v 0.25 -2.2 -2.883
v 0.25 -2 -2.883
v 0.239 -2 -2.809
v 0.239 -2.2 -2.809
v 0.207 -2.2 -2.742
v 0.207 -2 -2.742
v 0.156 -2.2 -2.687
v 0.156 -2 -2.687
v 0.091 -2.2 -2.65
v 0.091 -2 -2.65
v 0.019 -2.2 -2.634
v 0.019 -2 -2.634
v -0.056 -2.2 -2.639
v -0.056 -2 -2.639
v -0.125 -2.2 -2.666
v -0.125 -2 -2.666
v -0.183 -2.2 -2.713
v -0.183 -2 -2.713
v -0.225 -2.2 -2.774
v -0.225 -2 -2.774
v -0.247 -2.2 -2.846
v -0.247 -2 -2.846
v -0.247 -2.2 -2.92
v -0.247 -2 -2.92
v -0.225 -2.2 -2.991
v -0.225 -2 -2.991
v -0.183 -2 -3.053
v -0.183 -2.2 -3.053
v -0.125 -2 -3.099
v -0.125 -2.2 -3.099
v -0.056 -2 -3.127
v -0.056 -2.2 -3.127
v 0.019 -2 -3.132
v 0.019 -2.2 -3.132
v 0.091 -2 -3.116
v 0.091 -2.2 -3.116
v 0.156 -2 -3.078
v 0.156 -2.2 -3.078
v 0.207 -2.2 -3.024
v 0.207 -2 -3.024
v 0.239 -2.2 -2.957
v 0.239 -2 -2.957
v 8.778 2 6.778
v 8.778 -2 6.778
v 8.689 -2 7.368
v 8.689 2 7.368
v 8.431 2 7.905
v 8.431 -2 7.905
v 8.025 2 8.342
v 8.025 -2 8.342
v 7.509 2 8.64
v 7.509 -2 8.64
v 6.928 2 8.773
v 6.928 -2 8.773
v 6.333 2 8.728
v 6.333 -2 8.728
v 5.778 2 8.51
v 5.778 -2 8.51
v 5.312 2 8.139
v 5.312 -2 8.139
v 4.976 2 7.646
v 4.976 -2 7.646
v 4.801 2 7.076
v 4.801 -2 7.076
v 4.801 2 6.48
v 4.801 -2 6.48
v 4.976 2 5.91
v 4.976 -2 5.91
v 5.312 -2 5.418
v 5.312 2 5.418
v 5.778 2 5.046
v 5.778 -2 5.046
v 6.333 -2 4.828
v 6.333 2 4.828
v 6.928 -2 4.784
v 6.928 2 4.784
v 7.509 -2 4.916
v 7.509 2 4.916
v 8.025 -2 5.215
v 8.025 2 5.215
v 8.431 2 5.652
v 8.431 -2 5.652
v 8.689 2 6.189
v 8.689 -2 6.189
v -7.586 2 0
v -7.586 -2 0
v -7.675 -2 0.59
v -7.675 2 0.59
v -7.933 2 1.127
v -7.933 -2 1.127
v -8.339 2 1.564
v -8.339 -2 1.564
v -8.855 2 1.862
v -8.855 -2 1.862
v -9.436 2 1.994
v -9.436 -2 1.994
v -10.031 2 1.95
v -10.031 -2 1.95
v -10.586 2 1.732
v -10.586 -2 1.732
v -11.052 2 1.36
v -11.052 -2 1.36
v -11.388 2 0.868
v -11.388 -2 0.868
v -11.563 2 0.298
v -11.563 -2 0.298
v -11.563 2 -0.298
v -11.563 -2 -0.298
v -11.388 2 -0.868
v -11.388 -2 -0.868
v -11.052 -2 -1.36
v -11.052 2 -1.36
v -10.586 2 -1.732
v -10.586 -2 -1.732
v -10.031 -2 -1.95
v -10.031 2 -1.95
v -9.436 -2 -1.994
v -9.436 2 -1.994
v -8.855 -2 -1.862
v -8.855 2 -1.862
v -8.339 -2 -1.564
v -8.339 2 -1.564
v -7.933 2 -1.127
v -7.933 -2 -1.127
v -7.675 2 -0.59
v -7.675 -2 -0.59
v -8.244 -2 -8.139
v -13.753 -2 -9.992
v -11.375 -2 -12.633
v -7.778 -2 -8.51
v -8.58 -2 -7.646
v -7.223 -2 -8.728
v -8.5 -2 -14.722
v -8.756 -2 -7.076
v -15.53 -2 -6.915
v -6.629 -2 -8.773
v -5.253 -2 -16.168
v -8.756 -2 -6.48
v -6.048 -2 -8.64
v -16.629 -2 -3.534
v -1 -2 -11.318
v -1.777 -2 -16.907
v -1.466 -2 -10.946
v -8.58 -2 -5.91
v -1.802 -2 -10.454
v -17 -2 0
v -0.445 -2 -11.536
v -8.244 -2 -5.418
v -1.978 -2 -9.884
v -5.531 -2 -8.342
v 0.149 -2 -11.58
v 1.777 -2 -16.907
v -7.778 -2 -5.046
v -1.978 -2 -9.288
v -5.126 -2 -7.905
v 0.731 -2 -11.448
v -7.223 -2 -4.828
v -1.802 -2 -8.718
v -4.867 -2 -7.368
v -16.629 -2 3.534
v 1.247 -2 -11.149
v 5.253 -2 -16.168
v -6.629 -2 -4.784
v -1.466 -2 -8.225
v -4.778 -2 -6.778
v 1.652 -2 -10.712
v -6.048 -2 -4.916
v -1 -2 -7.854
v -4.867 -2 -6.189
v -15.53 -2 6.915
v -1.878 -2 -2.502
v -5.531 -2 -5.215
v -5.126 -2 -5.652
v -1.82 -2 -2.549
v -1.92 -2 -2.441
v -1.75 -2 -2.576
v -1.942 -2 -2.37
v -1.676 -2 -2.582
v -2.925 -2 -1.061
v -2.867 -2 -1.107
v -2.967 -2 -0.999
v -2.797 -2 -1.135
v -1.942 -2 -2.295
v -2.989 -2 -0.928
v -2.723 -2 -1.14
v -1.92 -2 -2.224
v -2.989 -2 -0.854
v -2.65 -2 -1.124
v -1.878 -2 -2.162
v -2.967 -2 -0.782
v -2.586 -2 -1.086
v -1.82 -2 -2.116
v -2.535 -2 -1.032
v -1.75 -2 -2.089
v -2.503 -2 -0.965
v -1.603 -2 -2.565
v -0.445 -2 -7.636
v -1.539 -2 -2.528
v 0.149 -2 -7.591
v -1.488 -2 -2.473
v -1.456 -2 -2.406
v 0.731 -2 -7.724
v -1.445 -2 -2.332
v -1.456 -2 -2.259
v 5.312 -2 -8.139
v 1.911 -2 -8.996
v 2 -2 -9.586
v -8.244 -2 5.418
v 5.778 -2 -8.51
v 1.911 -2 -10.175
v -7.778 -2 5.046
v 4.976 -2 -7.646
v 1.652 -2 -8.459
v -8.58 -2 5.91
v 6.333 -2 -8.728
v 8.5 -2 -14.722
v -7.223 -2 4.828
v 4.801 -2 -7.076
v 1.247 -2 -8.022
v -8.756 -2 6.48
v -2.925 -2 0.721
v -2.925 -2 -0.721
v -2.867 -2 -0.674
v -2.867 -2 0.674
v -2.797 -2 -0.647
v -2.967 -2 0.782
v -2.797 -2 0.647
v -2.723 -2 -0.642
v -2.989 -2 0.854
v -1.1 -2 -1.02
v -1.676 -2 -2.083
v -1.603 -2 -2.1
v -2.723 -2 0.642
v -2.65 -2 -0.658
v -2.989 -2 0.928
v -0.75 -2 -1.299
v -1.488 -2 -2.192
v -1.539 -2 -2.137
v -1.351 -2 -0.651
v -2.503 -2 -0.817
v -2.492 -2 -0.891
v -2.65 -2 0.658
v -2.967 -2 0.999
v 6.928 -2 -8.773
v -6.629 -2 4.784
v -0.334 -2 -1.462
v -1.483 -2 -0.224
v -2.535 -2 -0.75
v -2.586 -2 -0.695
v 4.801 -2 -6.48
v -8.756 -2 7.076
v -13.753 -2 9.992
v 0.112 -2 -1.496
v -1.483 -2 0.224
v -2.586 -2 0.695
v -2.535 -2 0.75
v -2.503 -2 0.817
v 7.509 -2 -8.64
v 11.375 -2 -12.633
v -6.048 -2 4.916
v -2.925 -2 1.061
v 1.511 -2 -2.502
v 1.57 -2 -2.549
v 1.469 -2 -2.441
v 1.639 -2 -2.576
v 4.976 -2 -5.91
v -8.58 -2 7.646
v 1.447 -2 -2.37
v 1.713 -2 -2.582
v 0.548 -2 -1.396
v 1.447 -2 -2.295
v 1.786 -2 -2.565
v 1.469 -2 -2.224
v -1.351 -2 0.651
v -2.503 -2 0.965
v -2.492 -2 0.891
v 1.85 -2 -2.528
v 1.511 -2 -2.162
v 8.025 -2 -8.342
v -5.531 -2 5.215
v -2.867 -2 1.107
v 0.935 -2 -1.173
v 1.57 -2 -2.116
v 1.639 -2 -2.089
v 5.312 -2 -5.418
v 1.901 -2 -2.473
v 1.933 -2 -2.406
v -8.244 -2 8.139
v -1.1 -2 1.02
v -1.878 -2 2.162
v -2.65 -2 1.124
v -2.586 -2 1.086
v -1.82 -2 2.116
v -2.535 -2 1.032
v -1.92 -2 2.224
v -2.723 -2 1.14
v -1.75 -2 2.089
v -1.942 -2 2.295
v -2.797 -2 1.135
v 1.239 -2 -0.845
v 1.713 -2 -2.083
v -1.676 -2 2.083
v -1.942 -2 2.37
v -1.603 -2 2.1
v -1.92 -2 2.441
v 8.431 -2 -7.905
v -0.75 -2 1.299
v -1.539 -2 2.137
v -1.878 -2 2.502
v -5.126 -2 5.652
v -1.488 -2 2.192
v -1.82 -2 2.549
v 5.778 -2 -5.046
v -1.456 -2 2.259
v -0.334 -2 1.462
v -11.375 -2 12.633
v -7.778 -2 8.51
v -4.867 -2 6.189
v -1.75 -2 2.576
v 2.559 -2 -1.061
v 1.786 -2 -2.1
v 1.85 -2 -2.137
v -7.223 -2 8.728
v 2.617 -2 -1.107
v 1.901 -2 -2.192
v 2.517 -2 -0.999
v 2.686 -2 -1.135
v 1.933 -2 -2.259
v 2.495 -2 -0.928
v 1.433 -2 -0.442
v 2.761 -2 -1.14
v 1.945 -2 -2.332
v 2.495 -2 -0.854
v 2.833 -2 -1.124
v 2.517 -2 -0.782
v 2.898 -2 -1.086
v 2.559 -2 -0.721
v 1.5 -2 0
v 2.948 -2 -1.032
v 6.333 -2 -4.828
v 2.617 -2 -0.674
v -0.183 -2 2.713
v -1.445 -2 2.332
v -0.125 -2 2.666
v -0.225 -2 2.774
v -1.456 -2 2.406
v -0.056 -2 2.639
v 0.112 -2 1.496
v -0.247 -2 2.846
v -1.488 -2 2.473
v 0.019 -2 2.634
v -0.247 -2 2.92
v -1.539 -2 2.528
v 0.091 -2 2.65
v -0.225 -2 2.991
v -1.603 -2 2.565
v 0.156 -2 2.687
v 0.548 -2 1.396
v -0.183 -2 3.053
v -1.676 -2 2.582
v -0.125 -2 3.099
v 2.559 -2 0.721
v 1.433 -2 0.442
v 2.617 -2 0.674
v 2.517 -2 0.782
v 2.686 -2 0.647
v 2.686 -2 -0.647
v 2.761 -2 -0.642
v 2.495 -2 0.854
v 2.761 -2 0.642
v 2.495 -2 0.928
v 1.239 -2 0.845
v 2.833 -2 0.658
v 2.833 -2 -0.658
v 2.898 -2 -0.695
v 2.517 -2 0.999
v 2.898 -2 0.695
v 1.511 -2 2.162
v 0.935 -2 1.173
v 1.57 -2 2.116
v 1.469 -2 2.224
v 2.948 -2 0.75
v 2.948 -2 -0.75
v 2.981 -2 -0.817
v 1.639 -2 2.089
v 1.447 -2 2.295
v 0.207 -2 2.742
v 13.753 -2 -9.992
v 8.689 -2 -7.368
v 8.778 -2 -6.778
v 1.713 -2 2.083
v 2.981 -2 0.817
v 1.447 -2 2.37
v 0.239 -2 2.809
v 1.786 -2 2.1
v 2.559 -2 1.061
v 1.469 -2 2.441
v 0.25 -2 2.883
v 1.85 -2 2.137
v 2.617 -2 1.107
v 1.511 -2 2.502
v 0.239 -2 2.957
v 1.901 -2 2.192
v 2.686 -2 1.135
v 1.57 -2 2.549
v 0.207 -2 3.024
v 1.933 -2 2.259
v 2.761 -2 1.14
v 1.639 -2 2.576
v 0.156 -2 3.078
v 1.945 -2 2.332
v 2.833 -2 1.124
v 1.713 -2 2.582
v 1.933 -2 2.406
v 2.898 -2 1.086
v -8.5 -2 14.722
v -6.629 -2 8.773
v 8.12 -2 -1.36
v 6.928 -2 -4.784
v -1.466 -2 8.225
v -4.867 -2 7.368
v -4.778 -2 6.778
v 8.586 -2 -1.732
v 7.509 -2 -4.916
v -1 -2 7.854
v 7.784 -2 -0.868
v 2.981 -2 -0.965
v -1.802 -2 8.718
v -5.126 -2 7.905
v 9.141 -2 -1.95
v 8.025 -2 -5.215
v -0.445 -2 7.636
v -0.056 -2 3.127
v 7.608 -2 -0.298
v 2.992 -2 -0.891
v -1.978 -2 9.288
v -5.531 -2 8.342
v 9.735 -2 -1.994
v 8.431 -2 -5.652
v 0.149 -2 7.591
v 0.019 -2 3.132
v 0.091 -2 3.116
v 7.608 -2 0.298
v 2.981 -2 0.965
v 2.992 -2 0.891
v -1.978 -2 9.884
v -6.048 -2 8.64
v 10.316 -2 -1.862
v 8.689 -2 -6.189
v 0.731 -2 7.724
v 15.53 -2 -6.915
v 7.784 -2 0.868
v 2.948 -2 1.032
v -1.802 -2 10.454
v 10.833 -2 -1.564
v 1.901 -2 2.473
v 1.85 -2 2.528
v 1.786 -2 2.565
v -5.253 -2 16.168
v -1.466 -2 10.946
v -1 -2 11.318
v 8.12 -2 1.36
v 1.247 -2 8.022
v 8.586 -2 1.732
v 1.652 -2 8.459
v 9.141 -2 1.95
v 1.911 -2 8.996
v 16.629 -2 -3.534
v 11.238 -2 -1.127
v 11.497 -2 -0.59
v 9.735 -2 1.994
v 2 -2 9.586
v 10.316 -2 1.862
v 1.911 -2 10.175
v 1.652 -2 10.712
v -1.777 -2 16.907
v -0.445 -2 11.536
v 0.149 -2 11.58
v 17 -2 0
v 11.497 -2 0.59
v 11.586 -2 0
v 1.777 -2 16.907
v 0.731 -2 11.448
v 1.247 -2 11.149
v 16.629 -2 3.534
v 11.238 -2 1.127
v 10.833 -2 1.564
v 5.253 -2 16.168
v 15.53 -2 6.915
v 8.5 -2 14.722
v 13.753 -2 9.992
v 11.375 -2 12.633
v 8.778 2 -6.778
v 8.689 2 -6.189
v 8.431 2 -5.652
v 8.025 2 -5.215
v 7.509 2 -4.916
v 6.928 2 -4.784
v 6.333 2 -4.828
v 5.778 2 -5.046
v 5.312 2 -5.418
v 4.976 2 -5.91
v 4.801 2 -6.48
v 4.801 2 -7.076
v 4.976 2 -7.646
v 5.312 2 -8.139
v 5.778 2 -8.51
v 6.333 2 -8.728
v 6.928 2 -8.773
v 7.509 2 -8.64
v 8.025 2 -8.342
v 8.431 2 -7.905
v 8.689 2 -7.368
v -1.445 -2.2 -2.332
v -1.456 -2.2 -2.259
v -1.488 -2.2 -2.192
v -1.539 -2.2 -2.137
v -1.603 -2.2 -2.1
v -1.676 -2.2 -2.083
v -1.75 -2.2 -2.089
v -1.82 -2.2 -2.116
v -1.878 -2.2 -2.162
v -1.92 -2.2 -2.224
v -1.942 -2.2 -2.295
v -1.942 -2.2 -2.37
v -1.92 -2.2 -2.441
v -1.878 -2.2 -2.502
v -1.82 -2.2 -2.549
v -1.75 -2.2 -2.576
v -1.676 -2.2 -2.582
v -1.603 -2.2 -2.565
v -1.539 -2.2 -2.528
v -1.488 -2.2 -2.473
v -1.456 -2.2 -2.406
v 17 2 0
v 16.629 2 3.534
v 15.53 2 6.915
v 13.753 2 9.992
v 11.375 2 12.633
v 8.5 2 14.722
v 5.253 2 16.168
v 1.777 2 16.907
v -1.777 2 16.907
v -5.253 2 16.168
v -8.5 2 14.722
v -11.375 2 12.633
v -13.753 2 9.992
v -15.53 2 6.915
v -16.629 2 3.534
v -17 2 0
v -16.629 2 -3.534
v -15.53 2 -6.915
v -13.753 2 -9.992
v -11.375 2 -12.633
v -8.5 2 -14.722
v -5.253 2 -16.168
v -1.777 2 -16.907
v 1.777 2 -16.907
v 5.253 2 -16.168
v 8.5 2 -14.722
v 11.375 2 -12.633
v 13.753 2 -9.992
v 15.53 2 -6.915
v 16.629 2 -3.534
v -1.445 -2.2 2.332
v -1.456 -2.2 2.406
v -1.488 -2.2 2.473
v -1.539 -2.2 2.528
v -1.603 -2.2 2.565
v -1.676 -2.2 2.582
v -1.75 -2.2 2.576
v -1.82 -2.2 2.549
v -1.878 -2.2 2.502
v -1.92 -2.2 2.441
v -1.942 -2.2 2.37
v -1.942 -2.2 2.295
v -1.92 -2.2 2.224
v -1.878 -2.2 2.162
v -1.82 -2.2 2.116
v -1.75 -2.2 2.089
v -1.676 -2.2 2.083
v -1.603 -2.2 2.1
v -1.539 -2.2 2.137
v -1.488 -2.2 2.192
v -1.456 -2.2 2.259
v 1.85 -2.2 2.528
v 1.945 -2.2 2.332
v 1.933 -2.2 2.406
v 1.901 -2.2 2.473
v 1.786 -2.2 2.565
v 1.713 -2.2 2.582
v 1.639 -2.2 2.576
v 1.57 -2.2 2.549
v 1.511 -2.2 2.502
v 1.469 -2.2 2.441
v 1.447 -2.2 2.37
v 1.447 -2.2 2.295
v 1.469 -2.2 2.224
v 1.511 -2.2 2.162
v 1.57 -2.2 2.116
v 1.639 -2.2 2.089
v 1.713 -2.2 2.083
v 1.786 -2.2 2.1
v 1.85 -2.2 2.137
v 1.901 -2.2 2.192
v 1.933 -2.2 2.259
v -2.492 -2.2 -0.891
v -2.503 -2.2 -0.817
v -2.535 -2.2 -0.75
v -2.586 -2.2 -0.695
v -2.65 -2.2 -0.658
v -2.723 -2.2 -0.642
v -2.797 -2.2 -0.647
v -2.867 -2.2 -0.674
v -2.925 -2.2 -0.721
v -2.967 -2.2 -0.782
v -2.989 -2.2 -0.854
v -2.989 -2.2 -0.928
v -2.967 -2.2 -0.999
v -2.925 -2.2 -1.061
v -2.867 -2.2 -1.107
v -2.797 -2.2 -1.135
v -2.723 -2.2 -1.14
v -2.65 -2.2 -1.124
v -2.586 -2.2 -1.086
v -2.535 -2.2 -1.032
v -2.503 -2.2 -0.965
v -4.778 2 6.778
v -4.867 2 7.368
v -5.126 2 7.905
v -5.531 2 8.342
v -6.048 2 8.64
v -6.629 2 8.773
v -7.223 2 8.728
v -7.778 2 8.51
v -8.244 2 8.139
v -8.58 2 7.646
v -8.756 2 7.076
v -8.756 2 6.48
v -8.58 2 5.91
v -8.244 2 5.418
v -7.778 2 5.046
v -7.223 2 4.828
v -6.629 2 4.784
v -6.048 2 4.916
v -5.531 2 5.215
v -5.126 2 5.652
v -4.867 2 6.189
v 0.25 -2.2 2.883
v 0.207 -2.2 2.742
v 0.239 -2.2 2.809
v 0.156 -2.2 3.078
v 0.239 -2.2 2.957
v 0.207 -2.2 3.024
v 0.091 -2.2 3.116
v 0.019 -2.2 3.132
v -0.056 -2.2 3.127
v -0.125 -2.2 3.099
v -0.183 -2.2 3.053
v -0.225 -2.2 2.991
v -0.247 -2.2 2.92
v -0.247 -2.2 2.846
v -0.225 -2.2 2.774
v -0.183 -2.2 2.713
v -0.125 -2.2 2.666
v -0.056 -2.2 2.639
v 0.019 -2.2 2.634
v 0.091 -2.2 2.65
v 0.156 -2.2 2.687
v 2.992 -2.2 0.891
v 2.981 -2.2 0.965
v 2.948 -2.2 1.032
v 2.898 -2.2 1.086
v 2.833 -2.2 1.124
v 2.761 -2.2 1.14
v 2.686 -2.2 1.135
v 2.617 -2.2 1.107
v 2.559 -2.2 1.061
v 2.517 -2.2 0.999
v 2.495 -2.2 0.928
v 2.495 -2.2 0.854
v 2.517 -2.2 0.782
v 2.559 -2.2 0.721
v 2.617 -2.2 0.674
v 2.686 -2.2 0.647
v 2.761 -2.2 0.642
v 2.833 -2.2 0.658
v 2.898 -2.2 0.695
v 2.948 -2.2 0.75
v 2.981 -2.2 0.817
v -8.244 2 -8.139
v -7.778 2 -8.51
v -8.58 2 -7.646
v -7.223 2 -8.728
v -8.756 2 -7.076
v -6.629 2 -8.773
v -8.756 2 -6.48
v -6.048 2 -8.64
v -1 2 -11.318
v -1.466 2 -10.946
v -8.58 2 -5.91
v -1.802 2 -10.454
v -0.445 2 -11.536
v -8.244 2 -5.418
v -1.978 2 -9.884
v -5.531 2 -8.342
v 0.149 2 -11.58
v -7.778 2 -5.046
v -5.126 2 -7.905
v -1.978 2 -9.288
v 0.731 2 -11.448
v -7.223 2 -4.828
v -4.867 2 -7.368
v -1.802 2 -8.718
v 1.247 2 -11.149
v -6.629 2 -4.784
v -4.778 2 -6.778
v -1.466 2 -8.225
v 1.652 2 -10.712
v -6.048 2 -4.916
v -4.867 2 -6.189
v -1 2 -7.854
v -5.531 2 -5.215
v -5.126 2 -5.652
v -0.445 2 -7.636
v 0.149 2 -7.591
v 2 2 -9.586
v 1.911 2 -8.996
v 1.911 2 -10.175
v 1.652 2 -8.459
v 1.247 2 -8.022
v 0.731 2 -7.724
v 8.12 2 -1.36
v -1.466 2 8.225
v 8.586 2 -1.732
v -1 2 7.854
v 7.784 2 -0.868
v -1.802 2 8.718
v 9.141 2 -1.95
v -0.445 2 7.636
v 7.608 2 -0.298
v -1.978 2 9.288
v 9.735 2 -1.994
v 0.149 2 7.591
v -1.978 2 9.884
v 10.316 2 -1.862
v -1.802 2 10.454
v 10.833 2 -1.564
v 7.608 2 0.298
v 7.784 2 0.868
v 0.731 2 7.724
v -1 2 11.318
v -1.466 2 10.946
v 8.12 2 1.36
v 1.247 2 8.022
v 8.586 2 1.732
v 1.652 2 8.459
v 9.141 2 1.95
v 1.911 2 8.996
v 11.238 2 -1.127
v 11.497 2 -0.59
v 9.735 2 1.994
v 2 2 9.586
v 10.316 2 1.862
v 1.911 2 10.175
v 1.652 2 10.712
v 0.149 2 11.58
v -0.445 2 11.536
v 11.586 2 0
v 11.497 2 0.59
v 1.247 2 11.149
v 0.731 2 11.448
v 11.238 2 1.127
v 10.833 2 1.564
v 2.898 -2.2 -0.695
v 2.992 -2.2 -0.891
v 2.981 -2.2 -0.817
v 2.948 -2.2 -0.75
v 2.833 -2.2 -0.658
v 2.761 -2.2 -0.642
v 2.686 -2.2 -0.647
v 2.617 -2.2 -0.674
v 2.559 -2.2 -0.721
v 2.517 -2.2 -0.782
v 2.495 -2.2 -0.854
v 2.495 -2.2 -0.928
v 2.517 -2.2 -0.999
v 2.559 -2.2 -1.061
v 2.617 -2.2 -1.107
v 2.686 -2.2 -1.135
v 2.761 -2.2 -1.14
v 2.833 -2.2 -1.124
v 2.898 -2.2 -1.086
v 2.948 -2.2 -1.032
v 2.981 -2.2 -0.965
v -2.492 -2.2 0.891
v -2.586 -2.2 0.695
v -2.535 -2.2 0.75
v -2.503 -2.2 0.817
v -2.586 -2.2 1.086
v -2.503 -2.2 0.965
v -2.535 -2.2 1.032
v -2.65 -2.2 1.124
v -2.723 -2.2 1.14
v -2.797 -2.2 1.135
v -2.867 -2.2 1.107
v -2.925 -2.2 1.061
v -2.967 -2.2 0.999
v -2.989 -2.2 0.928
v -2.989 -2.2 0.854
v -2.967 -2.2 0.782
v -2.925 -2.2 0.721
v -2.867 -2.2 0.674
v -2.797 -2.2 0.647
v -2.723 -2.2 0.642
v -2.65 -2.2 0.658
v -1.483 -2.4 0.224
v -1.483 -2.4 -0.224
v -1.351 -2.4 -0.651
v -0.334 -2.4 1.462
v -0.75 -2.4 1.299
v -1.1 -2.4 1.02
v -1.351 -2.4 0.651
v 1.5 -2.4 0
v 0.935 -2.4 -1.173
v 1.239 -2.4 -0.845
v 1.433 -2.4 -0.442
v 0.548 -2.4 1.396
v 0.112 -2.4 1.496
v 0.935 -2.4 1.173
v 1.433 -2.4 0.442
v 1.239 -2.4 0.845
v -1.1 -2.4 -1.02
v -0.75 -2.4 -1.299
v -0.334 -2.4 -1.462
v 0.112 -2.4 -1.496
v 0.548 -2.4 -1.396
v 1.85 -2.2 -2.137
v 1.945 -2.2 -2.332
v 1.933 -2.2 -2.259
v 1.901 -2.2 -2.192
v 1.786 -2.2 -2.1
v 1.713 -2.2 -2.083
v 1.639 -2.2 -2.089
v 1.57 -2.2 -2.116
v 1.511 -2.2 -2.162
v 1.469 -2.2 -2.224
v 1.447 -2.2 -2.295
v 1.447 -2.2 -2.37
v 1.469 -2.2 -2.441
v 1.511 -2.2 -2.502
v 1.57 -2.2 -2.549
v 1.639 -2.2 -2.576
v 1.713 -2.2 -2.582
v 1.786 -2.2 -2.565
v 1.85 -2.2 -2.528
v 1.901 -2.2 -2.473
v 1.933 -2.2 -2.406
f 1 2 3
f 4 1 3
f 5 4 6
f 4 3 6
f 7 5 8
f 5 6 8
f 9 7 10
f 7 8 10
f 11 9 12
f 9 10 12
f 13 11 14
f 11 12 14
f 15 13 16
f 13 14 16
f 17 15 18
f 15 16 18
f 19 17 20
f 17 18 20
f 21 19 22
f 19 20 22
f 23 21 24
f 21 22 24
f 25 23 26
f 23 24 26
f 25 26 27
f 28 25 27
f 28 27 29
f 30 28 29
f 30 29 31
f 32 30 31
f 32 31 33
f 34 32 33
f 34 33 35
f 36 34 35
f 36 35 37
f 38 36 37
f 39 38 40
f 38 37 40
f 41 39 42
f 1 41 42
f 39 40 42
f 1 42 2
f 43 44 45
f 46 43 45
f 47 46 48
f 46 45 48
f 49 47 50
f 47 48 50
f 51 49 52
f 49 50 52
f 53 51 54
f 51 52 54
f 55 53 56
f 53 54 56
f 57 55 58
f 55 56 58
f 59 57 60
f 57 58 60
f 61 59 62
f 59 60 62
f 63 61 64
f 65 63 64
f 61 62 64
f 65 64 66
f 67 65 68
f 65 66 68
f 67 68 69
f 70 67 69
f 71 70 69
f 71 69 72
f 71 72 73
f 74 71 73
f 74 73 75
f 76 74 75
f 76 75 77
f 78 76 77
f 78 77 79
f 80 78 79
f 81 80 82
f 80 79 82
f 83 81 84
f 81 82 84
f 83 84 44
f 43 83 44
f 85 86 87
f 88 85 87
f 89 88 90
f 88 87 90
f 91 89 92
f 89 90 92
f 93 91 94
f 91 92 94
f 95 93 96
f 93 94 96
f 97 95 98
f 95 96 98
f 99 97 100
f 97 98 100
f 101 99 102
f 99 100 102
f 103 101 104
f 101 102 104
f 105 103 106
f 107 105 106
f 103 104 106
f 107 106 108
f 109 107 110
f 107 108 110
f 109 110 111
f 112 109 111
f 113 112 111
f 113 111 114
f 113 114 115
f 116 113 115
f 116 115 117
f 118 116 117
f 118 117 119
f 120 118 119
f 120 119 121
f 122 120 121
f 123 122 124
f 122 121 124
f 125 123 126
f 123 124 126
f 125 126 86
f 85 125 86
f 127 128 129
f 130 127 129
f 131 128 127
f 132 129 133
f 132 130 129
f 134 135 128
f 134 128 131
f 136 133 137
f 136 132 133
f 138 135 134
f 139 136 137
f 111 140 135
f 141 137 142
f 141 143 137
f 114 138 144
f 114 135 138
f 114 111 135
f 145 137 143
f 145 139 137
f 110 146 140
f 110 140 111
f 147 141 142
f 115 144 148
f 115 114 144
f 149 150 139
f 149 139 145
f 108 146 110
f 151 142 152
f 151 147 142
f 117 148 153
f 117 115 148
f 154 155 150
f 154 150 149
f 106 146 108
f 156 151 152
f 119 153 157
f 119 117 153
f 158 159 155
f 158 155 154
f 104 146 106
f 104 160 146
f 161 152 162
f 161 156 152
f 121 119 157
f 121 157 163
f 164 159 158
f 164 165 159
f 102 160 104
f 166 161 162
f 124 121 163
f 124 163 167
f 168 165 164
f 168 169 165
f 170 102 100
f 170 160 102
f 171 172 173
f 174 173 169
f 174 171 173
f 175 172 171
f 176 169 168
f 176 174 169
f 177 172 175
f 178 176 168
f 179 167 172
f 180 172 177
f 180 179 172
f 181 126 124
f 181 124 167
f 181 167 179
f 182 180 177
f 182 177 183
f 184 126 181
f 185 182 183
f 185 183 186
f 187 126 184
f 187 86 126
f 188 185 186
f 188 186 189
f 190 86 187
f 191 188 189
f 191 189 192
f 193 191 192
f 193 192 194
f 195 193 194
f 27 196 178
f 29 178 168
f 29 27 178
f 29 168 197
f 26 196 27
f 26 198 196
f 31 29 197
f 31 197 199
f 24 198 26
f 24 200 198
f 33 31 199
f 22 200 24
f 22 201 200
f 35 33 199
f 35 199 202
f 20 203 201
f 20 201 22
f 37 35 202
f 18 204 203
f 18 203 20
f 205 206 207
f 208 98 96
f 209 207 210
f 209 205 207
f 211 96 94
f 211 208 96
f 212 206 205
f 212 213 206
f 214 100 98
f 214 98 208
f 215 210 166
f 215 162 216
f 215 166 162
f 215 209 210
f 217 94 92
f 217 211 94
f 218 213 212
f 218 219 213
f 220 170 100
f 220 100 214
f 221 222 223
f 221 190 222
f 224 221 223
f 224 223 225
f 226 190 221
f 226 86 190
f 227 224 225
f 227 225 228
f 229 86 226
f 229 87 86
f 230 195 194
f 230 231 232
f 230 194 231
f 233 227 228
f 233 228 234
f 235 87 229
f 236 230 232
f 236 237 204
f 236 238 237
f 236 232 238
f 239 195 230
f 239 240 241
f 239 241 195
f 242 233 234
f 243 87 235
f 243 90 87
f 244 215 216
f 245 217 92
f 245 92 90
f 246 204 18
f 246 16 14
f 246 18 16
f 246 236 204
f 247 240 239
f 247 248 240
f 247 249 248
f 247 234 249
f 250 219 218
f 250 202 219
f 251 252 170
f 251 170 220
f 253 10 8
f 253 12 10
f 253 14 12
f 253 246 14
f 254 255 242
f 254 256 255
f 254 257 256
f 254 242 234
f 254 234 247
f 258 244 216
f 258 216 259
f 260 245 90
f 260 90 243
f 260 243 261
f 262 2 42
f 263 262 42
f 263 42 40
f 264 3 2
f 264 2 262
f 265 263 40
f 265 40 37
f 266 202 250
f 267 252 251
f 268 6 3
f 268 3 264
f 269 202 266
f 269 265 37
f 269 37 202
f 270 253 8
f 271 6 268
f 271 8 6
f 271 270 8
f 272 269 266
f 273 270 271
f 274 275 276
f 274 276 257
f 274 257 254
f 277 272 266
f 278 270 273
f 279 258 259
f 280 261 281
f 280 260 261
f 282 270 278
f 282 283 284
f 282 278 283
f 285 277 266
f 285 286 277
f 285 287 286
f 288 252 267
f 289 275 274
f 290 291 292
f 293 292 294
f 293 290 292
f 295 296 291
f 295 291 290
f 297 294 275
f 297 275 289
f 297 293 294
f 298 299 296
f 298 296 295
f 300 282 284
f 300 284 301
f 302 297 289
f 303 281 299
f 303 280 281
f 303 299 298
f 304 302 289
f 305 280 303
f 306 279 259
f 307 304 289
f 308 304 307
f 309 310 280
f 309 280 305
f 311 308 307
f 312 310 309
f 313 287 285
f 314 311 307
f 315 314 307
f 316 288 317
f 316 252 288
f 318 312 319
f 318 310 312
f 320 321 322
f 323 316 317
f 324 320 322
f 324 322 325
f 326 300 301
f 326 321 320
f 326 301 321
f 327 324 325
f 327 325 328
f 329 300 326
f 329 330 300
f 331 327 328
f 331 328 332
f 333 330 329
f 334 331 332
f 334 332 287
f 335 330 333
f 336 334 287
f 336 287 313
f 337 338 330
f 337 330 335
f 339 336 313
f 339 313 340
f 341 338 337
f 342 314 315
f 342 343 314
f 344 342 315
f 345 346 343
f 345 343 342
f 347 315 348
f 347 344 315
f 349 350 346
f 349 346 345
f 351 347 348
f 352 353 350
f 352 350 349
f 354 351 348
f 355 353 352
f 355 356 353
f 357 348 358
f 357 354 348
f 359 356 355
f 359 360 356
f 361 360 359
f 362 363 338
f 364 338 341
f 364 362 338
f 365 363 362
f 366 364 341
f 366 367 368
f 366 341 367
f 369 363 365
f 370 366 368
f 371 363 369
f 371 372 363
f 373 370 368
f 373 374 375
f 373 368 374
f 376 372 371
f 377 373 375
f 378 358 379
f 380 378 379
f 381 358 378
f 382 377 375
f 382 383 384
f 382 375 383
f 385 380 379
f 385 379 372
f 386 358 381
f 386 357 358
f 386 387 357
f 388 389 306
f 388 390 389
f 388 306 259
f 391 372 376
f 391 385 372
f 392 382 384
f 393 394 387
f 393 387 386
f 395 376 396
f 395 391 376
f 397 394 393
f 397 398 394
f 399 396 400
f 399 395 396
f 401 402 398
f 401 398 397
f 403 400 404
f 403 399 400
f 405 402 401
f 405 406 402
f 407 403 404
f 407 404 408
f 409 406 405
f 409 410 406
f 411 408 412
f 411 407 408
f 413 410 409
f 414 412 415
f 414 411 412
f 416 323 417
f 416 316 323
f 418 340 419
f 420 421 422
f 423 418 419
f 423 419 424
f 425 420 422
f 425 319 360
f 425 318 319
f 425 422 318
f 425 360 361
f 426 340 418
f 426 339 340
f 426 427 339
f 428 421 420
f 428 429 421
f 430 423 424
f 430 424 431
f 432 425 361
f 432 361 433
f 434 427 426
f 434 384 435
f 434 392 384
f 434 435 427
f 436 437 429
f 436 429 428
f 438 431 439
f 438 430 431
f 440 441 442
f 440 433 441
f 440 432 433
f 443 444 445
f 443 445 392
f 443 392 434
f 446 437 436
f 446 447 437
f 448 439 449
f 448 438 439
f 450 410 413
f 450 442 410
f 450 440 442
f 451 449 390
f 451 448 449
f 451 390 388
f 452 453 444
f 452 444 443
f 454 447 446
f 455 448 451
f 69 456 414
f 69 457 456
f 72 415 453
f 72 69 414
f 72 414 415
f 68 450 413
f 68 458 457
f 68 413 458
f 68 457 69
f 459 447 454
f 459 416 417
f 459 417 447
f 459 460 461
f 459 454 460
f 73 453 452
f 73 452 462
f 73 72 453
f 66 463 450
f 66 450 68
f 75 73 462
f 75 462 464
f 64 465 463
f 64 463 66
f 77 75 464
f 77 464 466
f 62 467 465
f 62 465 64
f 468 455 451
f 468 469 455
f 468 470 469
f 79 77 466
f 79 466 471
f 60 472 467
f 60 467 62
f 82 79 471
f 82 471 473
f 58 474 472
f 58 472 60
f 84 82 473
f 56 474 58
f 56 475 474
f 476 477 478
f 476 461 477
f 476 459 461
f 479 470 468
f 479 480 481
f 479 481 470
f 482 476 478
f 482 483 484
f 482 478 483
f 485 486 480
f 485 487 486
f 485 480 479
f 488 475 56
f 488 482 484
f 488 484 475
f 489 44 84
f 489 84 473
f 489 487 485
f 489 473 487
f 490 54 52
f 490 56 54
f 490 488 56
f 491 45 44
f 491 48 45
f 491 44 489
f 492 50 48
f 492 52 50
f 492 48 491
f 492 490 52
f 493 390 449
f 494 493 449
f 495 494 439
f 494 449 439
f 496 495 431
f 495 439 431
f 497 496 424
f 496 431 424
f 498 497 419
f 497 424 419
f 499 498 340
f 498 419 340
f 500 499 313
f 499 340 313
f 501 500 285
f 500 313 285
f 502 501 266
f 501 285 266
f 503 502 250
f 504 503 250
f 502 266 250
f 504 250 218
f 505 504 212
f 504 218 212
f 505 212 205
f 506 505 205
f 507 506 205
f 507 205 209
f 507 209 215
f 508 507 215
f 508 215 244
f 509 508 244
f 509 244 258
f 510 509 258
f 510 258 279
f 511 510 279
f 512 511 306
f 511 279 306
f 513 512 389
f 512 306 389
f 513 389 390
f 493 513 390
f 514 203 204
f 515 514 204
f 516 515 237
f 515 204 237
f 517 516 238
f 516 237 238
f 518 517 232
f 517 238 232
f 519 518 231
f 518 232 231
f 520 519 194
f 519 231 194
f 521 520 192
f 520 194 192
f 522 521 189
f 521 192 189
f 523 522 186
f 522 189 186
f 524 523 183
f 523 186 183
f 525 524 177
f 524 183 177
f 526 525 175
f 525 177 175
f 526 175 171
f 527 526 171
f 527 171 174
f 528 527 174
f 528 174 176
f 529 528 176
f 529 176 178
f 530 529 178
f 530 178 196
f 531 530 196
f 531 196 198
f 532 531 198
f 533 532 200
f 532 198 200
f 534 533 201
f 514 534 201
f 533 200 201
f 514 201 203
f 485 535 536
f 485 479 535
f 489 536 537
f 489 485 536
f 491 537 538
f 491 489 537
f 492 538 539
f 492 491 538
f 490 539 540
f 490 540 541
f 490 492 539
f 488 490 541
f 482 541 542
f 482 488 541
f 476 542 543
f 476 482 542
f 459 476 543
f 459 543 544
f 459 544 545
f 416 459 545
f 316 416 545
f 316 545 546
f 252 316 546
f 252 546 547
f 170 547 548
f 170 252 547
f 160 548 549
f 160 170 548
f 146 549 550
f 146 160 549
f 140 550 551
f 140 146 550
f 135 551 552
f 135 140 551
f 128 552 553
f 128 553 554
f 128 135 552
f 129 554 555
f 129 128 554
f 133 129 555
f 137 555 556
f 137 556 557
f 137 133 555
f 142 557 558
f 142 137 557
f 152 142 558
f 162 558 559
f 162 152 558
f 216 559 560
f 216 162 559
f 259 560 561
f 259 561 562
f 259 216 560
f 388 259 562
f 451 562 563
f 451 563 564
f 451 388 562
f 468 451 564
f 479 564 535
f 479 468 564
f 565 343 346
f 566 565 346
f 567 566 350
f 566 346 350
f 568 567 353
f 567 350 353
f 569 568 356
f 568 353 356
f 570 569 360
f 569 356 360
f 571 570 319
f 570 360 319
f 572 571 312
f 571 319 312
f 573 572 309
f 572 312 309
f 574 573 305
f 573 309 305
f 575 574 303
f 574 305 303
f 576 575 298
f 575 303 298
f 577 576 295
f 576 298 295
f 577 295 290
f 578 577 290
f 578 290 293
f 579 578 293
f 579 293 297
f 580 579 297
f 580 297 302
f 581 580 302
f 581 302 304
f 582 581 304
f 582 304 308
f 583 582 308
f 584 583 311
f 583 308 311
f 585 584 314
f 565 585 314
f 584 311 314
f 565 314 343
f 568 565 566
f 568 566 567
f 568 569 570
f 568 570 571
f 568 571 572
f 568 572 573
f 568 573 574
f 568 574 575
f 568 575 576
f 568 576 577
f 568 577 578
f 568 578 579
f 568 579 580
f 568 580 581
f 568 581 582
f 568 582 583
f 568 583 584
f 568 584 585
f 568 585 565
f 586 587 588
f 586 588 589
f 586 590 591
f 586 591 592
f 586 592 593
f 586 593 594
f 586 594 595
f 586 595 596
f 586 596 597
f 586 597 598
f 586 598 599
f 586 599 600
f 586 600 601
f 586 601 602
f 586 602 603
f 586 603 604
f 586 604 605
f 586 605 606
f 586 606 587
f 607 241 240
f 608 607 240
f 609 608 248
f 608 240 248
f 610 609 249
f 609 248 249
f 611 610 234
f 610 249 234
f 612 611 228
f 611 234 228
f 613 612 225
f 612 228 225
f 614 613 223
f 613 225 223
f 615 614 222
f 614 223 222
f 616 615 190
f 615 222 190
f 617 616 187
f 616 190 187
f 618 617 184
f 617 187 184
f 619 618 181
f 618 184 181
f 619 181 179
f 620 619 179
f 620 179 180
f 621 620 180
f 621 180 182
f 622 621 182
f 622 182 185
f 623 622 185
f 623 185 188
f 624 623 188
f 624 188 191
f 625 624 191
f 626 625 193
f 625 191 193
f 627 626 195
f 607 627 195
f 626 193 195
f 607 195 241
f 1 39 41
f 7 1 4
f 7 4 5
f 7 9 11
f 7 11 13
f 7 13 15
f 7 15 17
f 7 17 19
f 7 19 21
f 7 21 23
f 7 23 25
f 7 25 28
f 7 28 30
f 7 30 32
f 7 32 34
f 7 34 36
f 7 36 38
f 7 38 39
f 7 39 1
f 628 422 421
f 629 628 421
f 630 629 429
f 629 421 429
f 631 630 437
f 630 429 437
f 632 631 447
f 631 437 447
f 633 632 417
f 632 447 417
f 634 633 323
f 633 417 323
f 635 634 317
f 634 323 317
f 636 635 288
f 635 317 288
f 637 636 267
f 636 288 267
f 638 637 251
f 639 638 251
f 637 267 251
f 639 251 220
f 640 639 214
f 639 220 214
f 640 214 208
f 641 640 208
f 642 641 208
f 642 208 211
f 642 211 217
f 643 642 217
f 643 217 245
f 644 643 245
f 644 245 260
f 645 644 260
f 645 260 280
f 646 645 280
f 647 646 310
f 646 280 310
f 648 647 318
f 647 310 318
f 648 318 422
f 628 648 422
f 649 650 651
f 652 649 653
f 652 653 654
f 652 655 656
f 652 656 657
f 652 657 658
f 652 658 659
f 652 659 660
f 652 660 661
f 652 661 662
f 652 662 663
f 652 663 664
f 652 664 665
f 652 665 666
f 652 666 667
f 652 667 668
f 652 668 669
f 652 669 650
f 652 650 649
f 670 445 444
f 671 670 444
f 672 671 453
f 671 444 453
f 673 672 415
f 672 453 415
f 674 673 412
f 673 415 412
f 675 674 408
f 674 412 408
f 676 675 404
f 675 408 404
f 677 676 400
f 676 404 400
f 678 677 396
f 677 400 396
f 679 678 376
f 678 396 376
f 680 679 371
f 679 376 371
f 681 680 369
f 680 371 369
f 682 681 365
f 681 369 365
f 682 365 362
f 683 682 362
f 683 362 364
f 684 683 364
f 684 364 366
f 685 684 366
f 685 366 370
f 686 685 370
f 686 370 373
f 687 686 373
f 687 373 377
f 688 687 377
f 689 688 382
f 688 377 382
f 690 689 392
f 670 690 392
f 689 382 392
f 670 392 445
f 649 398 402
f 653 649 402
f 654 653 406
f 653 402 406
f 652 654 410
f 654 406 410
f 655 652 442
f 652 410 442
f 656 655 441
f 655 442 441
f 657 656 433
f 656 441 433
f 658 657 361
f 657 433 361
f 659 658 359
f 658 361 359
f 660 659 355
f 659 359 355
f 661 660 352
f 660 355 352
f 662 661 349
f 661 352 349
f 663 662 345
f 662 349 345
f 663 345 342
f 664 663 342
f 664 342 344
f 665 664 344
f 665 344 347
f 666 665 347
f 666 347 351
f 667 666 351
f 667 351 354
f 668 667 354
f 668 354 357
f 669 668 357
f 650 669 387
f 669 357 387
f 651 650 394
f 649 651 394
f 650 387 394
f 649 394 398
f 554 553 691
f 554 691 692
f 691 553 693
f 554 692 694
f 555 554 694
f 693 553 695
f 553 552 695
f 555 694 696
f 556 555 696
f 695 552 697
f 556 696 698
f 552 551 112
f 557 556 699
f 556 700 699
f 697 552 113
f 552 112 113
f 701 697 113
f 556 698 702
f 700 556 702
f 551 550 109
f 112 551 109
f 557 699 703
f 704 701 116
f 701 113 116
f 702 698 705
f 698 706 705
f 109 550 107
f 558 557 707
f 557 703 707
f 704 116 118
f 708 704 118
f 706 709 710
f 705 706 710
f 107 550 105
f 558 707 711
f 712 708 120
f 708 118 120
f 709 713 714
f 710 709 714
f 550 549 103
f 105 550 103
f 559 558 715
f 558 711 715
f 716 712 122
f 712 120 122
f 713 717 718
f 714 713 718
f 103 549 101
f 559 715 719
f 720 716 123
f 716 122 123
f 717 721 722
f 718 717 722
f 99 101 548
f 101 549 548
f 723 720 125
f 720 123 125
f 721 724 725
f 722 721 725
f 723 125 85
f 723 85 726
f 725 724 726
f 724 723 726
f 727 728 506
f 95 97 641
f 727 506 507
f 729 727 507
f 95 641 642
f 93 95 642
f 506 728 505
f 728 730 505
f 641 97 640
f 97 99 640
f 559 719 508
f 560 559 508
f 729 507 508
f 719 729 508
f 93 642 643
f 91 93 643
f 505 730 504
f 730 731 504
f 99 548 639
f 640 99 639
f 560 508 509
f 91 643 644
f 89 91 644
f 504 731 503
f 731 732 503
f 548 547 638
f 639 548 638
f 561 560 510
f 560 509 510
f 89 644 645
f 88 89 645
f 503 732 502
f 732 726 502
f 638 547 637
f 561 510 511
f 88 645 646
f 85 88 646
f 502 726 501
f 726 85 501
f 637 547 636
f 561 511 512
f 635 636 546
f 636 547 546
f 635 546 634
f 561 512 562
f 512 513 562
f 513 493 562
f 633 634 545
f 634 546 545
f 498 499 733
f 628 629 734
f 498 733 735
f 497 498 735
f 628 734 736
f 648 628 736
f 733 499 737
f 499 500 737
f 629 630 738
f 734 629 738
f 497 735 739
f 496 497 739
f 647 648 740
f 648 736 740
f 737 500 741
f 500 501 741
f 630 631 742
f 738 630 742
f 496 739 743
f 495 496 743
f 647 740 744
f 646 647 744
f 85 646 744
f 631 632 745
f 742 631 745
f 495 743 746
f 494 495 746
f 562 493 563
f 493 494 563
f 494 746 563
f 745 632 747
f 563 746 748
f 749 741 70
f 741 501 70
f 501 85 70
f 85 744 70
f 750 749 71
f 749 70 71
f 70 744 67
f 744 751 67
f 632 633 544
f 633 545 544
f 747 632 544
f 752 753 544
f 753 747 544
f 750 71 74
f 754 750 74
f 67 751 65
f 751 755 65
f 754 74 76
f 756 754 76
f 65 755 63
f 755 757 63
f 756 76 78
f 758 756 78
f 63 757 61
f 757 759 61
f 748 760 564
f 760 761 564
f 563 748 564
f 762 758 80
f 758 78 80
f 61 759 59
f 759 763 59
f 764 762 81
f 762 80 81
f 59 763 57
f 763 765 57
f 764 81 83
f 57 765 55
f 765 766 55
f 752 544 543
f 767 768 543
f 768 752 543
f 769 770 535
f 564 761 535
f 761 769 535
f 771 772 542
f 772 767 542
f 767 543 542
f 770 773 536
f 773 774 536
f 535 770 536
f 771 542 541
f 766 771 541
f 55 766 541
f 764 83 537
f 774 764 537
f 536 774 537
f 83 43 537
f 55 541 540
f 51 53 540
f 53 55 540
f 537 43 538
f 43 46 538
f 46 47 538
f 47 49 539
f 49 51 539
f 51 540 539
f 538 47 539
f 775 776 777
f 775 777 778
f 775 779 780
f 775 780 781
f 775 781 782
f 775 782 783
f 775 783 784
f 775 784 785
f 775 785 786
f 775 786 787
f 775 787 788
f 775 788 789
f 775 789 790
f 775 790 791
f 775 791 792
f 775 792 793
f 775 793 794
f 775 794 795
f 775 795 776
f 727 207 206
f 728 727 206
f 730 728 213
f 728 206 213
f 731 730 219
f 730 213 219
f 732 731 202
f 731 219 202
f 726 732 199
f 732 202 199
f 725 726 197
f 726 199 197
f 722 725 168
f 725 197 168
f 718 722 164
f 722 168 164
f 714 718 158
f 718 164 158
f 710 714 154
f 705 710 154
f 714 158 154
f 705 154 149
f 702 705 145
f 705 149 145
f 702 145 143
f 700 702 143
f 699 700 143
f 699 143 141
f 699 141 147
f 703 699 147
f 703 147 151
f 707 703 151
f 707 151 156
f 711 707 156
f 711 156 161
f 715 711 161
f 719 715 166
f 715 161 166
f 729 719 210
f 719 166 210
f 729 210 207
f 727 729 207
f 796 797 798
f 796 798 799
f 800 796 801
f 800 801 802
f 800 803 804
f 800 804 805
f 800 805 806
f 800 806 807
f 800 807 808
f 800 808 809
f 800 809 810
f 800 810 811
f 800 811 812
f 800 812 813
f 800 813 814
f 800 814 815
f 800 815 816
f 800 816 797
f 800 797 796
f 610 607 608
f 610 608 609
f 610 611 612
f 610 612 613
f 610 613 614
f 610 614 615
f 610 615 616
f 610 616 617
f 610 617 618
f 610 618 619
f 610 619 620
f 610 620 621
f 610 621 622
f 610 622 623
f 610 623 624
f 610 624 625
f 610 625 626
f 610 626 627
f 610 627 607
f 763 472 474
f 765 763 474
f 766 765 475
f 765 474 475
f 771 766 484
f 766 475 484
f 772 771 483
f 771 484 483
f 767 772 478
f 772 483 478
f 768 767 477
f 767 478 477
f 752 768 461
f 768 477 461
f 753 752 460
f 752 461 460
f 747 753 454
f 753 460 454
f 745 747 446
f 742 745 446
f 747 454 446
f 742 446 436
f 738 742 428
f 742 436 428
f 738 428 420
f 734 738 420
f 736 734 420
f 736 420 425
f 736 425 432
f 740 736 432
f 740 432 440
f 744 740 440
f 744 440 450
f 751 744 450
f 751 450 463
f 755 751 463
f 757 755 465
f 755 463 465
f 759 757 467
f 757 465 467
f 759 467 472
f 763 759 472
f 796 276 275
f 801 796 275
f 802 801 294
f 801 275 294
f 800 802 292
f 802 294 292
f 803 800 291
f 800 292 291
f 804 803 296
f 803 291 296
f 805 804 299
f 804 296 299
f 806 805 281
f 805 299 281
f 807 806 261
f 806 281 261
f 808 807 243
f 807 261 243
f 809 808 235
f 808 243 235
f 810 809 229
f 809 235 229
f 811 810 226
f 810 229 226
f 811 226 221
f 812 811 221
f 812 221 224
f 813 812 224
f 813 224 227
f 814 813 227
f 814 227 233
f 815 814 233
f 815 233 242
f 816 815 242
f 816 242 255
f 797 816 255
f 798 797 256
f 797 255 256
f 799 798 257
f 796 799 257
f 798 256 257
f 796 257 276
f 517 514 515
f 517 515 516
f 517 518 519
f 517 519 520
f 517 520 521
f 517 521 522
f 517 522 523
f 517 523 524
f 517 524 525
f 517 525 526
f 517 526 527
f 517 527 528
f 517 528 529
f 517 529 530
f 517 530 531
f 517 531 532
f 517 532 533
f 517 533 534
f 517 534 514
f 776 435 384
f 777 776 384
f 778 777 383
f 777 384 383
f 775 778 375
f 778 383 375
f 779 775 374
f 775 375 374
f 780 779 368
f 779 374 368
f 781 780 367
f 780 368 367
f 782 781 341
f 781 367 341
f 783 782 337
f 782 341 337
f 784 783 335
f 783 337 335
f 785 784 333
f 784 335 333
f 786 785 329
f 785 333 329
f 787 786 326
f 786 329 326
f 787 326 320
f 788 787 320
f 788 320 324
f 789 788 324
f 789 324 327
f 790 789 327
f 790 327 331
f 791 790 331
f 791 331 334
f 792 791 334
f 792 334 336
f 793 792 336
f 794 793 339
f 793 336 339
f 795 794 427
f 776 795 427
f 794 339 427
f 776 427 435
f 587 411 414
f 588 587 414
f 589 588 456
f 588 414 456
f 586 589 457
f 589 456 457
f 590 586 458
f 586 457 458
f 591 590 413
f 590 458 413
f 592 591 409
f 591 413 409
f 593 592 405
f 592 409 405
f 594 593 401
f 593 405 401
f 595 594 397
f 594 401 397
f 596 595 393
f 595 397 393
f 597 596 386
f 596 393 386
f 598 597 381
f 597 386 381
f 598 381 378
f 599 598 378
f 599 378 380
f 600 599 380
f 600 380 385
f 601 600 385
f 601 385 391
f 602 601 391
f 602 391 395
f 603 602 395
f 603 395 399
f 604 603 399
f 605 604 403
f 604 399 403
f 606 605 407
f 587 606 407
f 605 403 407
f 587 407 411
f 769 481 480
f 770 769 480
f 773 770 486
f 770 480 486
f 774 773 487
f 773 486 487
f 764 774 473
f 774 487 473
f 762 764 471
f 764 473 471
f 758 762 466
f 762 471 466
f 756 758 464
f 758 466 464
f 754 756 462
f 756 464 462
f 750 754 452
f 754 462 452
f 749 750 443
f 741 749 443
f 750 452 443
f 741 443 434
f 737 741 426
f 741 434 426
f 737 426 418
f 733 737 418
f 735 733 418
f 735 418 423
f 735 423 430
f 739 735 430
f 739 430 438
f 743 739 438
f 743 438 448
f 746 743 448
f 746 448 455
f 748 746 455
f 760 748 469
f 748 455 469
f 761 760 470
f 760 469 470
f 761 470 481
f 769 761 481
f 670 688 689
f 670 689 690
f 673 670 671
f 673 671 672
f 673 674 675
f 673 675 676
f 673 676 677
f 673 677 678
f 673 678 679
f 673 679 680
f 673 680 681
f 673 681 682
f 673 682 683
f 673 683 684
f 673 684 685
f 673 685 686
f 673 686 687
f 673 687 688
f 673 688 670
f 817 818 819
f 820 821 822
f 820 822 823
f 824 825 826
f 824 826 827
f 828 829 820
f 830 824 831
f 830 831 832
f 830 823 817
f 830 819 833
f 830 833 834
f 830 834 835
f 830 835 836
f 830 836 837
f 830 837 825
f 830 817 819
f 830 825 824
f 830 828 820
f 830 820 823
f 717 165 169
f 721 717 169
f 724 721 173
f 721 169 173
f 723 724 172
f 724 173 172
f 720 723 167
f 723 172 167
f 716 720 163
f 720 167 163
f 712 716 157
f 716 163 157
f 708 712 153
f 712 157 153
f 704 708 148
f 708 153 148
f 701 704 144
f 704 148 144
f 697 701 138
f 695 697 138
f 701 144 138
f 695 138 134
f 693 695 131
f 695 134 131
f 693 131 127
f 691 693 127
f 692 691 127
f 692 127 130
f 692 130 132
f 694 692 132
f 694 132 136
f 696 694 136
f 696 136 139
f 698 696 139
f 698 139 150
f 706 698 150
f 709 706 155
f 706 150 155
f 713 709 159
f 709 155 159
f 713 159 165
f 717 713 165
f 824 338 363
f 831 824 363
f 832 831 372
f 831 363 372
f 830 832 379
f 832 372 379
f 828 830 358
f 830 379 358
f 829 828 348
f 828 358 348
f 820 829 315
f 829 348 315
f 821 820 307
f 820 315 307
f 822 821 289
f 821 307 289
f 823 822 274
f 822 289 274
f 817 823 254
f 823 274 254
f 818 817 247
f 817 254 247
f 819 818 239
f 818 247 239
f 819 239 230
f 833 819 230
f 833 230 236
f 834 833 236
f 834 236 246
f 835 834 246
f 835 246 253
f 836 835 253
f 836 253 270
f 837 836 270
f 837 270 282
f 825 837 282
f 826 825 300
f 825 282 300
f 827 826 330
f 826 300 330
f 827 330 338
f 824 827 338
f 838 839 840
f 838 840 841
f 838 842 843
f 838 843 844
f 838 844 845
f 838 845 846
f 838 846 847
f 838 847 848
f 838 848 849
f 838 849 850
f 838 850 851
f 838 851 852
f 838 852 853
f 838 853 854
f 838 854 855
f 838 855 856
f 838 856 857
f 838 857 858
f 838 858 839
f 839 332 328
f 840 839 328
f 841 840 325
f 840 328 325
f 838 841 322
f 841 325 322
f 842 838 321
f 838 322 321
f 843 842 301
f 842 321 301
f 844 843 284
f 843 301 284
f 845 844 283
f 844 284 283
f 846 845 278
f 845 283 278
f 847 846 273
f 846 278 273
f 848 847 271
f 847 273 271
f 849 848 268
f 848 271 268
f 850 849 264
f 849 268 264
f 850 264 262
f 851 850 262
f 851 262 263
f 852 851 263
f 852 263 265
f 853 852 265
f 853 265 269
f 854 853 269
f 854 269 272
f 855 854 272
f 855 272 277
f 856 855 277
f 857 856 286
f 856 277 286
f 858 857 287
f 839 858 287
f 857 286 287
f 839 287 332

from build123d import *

# Parameters (mm, degrees)
F0_R     = 17
F1_DEPTH = 2
F2_R     = 2
F3_DEPTH = 4
F4_R     = 0.25
F5_DEPTH = 0.2
F6_R     = 1.5
F7_DEPTH = 0.4


with BuildPart() as f1:
    # F0 (on Front) → F1 (new body, symmetric)
    with BuildSketch(Plane.XZ):
        Circle(F0_R)
    extrude(amount=F1_DEPTH, both=True)

    # F2 (on face) → F3 (cut)
    with BuildSketch(Plane.XZ.offset(2)):
        with Locations((-6.778185, 6.778185)):
            Circle(F2_R)
        with Locations((-9.5858, 0)):
            Circle(F2_R)
        with Locations((-6.778185, -6.778185)):
            Circle(F2_R)
        with Locations((0, -9.5858)):
            Circle(F2_R)
        with Locations((6.778185, -6.778185)):
            Circle(F2_R)
        with Locations((9.5858, 0)):
            Circle(F2_R)
        with Locations((6.778185, 6.778185)):
            Circle(F2_R)
        with Locations((0, 9.5858)):
            Circle(F2_R)
    extrude(amount=-F3_DEPTH, mode=Mode.SUBTRACT)

    # F4 (on face) → F5 (join)
    with BuildSketch(Plane.XZ.offset(2)):
        with Locations((-2.741827, 0.890874)):
            Circle(F4_R)
        with Locations((-2.741827, -0.890874)):
            Circle(F4_R)
        with Locations((-1.694542, -2.332337)):
            Circle(F4_R)
        with Locations((0, -2.882927)):
            Circle(F4_R)
        with Locations((1.694542, -2.332337)):
            Circle(F4_R)
        with Locations((2.741827, -0.890874)):
            Circle(F4_R)
        with Locations((2.741827, 0.890874)):
            Circle(F4_R)
        with Locations((1.694542, 2.332337)):
            Circle(F4_R)
        with Locations((0, 2.882927)):
            Circle(F4_R)
        with Locations((-1.694542, 2.332337)):
            Circle(F4_R)
    extrude(amount=F5_DEPTH)

    # F6 (on face) → F7 (join)
    with BuildSketch(Plane.XZ.offset(2)):
        Circle(F6_R)
    extrude(amount=F7_DEPTH)


solid = f1.part
